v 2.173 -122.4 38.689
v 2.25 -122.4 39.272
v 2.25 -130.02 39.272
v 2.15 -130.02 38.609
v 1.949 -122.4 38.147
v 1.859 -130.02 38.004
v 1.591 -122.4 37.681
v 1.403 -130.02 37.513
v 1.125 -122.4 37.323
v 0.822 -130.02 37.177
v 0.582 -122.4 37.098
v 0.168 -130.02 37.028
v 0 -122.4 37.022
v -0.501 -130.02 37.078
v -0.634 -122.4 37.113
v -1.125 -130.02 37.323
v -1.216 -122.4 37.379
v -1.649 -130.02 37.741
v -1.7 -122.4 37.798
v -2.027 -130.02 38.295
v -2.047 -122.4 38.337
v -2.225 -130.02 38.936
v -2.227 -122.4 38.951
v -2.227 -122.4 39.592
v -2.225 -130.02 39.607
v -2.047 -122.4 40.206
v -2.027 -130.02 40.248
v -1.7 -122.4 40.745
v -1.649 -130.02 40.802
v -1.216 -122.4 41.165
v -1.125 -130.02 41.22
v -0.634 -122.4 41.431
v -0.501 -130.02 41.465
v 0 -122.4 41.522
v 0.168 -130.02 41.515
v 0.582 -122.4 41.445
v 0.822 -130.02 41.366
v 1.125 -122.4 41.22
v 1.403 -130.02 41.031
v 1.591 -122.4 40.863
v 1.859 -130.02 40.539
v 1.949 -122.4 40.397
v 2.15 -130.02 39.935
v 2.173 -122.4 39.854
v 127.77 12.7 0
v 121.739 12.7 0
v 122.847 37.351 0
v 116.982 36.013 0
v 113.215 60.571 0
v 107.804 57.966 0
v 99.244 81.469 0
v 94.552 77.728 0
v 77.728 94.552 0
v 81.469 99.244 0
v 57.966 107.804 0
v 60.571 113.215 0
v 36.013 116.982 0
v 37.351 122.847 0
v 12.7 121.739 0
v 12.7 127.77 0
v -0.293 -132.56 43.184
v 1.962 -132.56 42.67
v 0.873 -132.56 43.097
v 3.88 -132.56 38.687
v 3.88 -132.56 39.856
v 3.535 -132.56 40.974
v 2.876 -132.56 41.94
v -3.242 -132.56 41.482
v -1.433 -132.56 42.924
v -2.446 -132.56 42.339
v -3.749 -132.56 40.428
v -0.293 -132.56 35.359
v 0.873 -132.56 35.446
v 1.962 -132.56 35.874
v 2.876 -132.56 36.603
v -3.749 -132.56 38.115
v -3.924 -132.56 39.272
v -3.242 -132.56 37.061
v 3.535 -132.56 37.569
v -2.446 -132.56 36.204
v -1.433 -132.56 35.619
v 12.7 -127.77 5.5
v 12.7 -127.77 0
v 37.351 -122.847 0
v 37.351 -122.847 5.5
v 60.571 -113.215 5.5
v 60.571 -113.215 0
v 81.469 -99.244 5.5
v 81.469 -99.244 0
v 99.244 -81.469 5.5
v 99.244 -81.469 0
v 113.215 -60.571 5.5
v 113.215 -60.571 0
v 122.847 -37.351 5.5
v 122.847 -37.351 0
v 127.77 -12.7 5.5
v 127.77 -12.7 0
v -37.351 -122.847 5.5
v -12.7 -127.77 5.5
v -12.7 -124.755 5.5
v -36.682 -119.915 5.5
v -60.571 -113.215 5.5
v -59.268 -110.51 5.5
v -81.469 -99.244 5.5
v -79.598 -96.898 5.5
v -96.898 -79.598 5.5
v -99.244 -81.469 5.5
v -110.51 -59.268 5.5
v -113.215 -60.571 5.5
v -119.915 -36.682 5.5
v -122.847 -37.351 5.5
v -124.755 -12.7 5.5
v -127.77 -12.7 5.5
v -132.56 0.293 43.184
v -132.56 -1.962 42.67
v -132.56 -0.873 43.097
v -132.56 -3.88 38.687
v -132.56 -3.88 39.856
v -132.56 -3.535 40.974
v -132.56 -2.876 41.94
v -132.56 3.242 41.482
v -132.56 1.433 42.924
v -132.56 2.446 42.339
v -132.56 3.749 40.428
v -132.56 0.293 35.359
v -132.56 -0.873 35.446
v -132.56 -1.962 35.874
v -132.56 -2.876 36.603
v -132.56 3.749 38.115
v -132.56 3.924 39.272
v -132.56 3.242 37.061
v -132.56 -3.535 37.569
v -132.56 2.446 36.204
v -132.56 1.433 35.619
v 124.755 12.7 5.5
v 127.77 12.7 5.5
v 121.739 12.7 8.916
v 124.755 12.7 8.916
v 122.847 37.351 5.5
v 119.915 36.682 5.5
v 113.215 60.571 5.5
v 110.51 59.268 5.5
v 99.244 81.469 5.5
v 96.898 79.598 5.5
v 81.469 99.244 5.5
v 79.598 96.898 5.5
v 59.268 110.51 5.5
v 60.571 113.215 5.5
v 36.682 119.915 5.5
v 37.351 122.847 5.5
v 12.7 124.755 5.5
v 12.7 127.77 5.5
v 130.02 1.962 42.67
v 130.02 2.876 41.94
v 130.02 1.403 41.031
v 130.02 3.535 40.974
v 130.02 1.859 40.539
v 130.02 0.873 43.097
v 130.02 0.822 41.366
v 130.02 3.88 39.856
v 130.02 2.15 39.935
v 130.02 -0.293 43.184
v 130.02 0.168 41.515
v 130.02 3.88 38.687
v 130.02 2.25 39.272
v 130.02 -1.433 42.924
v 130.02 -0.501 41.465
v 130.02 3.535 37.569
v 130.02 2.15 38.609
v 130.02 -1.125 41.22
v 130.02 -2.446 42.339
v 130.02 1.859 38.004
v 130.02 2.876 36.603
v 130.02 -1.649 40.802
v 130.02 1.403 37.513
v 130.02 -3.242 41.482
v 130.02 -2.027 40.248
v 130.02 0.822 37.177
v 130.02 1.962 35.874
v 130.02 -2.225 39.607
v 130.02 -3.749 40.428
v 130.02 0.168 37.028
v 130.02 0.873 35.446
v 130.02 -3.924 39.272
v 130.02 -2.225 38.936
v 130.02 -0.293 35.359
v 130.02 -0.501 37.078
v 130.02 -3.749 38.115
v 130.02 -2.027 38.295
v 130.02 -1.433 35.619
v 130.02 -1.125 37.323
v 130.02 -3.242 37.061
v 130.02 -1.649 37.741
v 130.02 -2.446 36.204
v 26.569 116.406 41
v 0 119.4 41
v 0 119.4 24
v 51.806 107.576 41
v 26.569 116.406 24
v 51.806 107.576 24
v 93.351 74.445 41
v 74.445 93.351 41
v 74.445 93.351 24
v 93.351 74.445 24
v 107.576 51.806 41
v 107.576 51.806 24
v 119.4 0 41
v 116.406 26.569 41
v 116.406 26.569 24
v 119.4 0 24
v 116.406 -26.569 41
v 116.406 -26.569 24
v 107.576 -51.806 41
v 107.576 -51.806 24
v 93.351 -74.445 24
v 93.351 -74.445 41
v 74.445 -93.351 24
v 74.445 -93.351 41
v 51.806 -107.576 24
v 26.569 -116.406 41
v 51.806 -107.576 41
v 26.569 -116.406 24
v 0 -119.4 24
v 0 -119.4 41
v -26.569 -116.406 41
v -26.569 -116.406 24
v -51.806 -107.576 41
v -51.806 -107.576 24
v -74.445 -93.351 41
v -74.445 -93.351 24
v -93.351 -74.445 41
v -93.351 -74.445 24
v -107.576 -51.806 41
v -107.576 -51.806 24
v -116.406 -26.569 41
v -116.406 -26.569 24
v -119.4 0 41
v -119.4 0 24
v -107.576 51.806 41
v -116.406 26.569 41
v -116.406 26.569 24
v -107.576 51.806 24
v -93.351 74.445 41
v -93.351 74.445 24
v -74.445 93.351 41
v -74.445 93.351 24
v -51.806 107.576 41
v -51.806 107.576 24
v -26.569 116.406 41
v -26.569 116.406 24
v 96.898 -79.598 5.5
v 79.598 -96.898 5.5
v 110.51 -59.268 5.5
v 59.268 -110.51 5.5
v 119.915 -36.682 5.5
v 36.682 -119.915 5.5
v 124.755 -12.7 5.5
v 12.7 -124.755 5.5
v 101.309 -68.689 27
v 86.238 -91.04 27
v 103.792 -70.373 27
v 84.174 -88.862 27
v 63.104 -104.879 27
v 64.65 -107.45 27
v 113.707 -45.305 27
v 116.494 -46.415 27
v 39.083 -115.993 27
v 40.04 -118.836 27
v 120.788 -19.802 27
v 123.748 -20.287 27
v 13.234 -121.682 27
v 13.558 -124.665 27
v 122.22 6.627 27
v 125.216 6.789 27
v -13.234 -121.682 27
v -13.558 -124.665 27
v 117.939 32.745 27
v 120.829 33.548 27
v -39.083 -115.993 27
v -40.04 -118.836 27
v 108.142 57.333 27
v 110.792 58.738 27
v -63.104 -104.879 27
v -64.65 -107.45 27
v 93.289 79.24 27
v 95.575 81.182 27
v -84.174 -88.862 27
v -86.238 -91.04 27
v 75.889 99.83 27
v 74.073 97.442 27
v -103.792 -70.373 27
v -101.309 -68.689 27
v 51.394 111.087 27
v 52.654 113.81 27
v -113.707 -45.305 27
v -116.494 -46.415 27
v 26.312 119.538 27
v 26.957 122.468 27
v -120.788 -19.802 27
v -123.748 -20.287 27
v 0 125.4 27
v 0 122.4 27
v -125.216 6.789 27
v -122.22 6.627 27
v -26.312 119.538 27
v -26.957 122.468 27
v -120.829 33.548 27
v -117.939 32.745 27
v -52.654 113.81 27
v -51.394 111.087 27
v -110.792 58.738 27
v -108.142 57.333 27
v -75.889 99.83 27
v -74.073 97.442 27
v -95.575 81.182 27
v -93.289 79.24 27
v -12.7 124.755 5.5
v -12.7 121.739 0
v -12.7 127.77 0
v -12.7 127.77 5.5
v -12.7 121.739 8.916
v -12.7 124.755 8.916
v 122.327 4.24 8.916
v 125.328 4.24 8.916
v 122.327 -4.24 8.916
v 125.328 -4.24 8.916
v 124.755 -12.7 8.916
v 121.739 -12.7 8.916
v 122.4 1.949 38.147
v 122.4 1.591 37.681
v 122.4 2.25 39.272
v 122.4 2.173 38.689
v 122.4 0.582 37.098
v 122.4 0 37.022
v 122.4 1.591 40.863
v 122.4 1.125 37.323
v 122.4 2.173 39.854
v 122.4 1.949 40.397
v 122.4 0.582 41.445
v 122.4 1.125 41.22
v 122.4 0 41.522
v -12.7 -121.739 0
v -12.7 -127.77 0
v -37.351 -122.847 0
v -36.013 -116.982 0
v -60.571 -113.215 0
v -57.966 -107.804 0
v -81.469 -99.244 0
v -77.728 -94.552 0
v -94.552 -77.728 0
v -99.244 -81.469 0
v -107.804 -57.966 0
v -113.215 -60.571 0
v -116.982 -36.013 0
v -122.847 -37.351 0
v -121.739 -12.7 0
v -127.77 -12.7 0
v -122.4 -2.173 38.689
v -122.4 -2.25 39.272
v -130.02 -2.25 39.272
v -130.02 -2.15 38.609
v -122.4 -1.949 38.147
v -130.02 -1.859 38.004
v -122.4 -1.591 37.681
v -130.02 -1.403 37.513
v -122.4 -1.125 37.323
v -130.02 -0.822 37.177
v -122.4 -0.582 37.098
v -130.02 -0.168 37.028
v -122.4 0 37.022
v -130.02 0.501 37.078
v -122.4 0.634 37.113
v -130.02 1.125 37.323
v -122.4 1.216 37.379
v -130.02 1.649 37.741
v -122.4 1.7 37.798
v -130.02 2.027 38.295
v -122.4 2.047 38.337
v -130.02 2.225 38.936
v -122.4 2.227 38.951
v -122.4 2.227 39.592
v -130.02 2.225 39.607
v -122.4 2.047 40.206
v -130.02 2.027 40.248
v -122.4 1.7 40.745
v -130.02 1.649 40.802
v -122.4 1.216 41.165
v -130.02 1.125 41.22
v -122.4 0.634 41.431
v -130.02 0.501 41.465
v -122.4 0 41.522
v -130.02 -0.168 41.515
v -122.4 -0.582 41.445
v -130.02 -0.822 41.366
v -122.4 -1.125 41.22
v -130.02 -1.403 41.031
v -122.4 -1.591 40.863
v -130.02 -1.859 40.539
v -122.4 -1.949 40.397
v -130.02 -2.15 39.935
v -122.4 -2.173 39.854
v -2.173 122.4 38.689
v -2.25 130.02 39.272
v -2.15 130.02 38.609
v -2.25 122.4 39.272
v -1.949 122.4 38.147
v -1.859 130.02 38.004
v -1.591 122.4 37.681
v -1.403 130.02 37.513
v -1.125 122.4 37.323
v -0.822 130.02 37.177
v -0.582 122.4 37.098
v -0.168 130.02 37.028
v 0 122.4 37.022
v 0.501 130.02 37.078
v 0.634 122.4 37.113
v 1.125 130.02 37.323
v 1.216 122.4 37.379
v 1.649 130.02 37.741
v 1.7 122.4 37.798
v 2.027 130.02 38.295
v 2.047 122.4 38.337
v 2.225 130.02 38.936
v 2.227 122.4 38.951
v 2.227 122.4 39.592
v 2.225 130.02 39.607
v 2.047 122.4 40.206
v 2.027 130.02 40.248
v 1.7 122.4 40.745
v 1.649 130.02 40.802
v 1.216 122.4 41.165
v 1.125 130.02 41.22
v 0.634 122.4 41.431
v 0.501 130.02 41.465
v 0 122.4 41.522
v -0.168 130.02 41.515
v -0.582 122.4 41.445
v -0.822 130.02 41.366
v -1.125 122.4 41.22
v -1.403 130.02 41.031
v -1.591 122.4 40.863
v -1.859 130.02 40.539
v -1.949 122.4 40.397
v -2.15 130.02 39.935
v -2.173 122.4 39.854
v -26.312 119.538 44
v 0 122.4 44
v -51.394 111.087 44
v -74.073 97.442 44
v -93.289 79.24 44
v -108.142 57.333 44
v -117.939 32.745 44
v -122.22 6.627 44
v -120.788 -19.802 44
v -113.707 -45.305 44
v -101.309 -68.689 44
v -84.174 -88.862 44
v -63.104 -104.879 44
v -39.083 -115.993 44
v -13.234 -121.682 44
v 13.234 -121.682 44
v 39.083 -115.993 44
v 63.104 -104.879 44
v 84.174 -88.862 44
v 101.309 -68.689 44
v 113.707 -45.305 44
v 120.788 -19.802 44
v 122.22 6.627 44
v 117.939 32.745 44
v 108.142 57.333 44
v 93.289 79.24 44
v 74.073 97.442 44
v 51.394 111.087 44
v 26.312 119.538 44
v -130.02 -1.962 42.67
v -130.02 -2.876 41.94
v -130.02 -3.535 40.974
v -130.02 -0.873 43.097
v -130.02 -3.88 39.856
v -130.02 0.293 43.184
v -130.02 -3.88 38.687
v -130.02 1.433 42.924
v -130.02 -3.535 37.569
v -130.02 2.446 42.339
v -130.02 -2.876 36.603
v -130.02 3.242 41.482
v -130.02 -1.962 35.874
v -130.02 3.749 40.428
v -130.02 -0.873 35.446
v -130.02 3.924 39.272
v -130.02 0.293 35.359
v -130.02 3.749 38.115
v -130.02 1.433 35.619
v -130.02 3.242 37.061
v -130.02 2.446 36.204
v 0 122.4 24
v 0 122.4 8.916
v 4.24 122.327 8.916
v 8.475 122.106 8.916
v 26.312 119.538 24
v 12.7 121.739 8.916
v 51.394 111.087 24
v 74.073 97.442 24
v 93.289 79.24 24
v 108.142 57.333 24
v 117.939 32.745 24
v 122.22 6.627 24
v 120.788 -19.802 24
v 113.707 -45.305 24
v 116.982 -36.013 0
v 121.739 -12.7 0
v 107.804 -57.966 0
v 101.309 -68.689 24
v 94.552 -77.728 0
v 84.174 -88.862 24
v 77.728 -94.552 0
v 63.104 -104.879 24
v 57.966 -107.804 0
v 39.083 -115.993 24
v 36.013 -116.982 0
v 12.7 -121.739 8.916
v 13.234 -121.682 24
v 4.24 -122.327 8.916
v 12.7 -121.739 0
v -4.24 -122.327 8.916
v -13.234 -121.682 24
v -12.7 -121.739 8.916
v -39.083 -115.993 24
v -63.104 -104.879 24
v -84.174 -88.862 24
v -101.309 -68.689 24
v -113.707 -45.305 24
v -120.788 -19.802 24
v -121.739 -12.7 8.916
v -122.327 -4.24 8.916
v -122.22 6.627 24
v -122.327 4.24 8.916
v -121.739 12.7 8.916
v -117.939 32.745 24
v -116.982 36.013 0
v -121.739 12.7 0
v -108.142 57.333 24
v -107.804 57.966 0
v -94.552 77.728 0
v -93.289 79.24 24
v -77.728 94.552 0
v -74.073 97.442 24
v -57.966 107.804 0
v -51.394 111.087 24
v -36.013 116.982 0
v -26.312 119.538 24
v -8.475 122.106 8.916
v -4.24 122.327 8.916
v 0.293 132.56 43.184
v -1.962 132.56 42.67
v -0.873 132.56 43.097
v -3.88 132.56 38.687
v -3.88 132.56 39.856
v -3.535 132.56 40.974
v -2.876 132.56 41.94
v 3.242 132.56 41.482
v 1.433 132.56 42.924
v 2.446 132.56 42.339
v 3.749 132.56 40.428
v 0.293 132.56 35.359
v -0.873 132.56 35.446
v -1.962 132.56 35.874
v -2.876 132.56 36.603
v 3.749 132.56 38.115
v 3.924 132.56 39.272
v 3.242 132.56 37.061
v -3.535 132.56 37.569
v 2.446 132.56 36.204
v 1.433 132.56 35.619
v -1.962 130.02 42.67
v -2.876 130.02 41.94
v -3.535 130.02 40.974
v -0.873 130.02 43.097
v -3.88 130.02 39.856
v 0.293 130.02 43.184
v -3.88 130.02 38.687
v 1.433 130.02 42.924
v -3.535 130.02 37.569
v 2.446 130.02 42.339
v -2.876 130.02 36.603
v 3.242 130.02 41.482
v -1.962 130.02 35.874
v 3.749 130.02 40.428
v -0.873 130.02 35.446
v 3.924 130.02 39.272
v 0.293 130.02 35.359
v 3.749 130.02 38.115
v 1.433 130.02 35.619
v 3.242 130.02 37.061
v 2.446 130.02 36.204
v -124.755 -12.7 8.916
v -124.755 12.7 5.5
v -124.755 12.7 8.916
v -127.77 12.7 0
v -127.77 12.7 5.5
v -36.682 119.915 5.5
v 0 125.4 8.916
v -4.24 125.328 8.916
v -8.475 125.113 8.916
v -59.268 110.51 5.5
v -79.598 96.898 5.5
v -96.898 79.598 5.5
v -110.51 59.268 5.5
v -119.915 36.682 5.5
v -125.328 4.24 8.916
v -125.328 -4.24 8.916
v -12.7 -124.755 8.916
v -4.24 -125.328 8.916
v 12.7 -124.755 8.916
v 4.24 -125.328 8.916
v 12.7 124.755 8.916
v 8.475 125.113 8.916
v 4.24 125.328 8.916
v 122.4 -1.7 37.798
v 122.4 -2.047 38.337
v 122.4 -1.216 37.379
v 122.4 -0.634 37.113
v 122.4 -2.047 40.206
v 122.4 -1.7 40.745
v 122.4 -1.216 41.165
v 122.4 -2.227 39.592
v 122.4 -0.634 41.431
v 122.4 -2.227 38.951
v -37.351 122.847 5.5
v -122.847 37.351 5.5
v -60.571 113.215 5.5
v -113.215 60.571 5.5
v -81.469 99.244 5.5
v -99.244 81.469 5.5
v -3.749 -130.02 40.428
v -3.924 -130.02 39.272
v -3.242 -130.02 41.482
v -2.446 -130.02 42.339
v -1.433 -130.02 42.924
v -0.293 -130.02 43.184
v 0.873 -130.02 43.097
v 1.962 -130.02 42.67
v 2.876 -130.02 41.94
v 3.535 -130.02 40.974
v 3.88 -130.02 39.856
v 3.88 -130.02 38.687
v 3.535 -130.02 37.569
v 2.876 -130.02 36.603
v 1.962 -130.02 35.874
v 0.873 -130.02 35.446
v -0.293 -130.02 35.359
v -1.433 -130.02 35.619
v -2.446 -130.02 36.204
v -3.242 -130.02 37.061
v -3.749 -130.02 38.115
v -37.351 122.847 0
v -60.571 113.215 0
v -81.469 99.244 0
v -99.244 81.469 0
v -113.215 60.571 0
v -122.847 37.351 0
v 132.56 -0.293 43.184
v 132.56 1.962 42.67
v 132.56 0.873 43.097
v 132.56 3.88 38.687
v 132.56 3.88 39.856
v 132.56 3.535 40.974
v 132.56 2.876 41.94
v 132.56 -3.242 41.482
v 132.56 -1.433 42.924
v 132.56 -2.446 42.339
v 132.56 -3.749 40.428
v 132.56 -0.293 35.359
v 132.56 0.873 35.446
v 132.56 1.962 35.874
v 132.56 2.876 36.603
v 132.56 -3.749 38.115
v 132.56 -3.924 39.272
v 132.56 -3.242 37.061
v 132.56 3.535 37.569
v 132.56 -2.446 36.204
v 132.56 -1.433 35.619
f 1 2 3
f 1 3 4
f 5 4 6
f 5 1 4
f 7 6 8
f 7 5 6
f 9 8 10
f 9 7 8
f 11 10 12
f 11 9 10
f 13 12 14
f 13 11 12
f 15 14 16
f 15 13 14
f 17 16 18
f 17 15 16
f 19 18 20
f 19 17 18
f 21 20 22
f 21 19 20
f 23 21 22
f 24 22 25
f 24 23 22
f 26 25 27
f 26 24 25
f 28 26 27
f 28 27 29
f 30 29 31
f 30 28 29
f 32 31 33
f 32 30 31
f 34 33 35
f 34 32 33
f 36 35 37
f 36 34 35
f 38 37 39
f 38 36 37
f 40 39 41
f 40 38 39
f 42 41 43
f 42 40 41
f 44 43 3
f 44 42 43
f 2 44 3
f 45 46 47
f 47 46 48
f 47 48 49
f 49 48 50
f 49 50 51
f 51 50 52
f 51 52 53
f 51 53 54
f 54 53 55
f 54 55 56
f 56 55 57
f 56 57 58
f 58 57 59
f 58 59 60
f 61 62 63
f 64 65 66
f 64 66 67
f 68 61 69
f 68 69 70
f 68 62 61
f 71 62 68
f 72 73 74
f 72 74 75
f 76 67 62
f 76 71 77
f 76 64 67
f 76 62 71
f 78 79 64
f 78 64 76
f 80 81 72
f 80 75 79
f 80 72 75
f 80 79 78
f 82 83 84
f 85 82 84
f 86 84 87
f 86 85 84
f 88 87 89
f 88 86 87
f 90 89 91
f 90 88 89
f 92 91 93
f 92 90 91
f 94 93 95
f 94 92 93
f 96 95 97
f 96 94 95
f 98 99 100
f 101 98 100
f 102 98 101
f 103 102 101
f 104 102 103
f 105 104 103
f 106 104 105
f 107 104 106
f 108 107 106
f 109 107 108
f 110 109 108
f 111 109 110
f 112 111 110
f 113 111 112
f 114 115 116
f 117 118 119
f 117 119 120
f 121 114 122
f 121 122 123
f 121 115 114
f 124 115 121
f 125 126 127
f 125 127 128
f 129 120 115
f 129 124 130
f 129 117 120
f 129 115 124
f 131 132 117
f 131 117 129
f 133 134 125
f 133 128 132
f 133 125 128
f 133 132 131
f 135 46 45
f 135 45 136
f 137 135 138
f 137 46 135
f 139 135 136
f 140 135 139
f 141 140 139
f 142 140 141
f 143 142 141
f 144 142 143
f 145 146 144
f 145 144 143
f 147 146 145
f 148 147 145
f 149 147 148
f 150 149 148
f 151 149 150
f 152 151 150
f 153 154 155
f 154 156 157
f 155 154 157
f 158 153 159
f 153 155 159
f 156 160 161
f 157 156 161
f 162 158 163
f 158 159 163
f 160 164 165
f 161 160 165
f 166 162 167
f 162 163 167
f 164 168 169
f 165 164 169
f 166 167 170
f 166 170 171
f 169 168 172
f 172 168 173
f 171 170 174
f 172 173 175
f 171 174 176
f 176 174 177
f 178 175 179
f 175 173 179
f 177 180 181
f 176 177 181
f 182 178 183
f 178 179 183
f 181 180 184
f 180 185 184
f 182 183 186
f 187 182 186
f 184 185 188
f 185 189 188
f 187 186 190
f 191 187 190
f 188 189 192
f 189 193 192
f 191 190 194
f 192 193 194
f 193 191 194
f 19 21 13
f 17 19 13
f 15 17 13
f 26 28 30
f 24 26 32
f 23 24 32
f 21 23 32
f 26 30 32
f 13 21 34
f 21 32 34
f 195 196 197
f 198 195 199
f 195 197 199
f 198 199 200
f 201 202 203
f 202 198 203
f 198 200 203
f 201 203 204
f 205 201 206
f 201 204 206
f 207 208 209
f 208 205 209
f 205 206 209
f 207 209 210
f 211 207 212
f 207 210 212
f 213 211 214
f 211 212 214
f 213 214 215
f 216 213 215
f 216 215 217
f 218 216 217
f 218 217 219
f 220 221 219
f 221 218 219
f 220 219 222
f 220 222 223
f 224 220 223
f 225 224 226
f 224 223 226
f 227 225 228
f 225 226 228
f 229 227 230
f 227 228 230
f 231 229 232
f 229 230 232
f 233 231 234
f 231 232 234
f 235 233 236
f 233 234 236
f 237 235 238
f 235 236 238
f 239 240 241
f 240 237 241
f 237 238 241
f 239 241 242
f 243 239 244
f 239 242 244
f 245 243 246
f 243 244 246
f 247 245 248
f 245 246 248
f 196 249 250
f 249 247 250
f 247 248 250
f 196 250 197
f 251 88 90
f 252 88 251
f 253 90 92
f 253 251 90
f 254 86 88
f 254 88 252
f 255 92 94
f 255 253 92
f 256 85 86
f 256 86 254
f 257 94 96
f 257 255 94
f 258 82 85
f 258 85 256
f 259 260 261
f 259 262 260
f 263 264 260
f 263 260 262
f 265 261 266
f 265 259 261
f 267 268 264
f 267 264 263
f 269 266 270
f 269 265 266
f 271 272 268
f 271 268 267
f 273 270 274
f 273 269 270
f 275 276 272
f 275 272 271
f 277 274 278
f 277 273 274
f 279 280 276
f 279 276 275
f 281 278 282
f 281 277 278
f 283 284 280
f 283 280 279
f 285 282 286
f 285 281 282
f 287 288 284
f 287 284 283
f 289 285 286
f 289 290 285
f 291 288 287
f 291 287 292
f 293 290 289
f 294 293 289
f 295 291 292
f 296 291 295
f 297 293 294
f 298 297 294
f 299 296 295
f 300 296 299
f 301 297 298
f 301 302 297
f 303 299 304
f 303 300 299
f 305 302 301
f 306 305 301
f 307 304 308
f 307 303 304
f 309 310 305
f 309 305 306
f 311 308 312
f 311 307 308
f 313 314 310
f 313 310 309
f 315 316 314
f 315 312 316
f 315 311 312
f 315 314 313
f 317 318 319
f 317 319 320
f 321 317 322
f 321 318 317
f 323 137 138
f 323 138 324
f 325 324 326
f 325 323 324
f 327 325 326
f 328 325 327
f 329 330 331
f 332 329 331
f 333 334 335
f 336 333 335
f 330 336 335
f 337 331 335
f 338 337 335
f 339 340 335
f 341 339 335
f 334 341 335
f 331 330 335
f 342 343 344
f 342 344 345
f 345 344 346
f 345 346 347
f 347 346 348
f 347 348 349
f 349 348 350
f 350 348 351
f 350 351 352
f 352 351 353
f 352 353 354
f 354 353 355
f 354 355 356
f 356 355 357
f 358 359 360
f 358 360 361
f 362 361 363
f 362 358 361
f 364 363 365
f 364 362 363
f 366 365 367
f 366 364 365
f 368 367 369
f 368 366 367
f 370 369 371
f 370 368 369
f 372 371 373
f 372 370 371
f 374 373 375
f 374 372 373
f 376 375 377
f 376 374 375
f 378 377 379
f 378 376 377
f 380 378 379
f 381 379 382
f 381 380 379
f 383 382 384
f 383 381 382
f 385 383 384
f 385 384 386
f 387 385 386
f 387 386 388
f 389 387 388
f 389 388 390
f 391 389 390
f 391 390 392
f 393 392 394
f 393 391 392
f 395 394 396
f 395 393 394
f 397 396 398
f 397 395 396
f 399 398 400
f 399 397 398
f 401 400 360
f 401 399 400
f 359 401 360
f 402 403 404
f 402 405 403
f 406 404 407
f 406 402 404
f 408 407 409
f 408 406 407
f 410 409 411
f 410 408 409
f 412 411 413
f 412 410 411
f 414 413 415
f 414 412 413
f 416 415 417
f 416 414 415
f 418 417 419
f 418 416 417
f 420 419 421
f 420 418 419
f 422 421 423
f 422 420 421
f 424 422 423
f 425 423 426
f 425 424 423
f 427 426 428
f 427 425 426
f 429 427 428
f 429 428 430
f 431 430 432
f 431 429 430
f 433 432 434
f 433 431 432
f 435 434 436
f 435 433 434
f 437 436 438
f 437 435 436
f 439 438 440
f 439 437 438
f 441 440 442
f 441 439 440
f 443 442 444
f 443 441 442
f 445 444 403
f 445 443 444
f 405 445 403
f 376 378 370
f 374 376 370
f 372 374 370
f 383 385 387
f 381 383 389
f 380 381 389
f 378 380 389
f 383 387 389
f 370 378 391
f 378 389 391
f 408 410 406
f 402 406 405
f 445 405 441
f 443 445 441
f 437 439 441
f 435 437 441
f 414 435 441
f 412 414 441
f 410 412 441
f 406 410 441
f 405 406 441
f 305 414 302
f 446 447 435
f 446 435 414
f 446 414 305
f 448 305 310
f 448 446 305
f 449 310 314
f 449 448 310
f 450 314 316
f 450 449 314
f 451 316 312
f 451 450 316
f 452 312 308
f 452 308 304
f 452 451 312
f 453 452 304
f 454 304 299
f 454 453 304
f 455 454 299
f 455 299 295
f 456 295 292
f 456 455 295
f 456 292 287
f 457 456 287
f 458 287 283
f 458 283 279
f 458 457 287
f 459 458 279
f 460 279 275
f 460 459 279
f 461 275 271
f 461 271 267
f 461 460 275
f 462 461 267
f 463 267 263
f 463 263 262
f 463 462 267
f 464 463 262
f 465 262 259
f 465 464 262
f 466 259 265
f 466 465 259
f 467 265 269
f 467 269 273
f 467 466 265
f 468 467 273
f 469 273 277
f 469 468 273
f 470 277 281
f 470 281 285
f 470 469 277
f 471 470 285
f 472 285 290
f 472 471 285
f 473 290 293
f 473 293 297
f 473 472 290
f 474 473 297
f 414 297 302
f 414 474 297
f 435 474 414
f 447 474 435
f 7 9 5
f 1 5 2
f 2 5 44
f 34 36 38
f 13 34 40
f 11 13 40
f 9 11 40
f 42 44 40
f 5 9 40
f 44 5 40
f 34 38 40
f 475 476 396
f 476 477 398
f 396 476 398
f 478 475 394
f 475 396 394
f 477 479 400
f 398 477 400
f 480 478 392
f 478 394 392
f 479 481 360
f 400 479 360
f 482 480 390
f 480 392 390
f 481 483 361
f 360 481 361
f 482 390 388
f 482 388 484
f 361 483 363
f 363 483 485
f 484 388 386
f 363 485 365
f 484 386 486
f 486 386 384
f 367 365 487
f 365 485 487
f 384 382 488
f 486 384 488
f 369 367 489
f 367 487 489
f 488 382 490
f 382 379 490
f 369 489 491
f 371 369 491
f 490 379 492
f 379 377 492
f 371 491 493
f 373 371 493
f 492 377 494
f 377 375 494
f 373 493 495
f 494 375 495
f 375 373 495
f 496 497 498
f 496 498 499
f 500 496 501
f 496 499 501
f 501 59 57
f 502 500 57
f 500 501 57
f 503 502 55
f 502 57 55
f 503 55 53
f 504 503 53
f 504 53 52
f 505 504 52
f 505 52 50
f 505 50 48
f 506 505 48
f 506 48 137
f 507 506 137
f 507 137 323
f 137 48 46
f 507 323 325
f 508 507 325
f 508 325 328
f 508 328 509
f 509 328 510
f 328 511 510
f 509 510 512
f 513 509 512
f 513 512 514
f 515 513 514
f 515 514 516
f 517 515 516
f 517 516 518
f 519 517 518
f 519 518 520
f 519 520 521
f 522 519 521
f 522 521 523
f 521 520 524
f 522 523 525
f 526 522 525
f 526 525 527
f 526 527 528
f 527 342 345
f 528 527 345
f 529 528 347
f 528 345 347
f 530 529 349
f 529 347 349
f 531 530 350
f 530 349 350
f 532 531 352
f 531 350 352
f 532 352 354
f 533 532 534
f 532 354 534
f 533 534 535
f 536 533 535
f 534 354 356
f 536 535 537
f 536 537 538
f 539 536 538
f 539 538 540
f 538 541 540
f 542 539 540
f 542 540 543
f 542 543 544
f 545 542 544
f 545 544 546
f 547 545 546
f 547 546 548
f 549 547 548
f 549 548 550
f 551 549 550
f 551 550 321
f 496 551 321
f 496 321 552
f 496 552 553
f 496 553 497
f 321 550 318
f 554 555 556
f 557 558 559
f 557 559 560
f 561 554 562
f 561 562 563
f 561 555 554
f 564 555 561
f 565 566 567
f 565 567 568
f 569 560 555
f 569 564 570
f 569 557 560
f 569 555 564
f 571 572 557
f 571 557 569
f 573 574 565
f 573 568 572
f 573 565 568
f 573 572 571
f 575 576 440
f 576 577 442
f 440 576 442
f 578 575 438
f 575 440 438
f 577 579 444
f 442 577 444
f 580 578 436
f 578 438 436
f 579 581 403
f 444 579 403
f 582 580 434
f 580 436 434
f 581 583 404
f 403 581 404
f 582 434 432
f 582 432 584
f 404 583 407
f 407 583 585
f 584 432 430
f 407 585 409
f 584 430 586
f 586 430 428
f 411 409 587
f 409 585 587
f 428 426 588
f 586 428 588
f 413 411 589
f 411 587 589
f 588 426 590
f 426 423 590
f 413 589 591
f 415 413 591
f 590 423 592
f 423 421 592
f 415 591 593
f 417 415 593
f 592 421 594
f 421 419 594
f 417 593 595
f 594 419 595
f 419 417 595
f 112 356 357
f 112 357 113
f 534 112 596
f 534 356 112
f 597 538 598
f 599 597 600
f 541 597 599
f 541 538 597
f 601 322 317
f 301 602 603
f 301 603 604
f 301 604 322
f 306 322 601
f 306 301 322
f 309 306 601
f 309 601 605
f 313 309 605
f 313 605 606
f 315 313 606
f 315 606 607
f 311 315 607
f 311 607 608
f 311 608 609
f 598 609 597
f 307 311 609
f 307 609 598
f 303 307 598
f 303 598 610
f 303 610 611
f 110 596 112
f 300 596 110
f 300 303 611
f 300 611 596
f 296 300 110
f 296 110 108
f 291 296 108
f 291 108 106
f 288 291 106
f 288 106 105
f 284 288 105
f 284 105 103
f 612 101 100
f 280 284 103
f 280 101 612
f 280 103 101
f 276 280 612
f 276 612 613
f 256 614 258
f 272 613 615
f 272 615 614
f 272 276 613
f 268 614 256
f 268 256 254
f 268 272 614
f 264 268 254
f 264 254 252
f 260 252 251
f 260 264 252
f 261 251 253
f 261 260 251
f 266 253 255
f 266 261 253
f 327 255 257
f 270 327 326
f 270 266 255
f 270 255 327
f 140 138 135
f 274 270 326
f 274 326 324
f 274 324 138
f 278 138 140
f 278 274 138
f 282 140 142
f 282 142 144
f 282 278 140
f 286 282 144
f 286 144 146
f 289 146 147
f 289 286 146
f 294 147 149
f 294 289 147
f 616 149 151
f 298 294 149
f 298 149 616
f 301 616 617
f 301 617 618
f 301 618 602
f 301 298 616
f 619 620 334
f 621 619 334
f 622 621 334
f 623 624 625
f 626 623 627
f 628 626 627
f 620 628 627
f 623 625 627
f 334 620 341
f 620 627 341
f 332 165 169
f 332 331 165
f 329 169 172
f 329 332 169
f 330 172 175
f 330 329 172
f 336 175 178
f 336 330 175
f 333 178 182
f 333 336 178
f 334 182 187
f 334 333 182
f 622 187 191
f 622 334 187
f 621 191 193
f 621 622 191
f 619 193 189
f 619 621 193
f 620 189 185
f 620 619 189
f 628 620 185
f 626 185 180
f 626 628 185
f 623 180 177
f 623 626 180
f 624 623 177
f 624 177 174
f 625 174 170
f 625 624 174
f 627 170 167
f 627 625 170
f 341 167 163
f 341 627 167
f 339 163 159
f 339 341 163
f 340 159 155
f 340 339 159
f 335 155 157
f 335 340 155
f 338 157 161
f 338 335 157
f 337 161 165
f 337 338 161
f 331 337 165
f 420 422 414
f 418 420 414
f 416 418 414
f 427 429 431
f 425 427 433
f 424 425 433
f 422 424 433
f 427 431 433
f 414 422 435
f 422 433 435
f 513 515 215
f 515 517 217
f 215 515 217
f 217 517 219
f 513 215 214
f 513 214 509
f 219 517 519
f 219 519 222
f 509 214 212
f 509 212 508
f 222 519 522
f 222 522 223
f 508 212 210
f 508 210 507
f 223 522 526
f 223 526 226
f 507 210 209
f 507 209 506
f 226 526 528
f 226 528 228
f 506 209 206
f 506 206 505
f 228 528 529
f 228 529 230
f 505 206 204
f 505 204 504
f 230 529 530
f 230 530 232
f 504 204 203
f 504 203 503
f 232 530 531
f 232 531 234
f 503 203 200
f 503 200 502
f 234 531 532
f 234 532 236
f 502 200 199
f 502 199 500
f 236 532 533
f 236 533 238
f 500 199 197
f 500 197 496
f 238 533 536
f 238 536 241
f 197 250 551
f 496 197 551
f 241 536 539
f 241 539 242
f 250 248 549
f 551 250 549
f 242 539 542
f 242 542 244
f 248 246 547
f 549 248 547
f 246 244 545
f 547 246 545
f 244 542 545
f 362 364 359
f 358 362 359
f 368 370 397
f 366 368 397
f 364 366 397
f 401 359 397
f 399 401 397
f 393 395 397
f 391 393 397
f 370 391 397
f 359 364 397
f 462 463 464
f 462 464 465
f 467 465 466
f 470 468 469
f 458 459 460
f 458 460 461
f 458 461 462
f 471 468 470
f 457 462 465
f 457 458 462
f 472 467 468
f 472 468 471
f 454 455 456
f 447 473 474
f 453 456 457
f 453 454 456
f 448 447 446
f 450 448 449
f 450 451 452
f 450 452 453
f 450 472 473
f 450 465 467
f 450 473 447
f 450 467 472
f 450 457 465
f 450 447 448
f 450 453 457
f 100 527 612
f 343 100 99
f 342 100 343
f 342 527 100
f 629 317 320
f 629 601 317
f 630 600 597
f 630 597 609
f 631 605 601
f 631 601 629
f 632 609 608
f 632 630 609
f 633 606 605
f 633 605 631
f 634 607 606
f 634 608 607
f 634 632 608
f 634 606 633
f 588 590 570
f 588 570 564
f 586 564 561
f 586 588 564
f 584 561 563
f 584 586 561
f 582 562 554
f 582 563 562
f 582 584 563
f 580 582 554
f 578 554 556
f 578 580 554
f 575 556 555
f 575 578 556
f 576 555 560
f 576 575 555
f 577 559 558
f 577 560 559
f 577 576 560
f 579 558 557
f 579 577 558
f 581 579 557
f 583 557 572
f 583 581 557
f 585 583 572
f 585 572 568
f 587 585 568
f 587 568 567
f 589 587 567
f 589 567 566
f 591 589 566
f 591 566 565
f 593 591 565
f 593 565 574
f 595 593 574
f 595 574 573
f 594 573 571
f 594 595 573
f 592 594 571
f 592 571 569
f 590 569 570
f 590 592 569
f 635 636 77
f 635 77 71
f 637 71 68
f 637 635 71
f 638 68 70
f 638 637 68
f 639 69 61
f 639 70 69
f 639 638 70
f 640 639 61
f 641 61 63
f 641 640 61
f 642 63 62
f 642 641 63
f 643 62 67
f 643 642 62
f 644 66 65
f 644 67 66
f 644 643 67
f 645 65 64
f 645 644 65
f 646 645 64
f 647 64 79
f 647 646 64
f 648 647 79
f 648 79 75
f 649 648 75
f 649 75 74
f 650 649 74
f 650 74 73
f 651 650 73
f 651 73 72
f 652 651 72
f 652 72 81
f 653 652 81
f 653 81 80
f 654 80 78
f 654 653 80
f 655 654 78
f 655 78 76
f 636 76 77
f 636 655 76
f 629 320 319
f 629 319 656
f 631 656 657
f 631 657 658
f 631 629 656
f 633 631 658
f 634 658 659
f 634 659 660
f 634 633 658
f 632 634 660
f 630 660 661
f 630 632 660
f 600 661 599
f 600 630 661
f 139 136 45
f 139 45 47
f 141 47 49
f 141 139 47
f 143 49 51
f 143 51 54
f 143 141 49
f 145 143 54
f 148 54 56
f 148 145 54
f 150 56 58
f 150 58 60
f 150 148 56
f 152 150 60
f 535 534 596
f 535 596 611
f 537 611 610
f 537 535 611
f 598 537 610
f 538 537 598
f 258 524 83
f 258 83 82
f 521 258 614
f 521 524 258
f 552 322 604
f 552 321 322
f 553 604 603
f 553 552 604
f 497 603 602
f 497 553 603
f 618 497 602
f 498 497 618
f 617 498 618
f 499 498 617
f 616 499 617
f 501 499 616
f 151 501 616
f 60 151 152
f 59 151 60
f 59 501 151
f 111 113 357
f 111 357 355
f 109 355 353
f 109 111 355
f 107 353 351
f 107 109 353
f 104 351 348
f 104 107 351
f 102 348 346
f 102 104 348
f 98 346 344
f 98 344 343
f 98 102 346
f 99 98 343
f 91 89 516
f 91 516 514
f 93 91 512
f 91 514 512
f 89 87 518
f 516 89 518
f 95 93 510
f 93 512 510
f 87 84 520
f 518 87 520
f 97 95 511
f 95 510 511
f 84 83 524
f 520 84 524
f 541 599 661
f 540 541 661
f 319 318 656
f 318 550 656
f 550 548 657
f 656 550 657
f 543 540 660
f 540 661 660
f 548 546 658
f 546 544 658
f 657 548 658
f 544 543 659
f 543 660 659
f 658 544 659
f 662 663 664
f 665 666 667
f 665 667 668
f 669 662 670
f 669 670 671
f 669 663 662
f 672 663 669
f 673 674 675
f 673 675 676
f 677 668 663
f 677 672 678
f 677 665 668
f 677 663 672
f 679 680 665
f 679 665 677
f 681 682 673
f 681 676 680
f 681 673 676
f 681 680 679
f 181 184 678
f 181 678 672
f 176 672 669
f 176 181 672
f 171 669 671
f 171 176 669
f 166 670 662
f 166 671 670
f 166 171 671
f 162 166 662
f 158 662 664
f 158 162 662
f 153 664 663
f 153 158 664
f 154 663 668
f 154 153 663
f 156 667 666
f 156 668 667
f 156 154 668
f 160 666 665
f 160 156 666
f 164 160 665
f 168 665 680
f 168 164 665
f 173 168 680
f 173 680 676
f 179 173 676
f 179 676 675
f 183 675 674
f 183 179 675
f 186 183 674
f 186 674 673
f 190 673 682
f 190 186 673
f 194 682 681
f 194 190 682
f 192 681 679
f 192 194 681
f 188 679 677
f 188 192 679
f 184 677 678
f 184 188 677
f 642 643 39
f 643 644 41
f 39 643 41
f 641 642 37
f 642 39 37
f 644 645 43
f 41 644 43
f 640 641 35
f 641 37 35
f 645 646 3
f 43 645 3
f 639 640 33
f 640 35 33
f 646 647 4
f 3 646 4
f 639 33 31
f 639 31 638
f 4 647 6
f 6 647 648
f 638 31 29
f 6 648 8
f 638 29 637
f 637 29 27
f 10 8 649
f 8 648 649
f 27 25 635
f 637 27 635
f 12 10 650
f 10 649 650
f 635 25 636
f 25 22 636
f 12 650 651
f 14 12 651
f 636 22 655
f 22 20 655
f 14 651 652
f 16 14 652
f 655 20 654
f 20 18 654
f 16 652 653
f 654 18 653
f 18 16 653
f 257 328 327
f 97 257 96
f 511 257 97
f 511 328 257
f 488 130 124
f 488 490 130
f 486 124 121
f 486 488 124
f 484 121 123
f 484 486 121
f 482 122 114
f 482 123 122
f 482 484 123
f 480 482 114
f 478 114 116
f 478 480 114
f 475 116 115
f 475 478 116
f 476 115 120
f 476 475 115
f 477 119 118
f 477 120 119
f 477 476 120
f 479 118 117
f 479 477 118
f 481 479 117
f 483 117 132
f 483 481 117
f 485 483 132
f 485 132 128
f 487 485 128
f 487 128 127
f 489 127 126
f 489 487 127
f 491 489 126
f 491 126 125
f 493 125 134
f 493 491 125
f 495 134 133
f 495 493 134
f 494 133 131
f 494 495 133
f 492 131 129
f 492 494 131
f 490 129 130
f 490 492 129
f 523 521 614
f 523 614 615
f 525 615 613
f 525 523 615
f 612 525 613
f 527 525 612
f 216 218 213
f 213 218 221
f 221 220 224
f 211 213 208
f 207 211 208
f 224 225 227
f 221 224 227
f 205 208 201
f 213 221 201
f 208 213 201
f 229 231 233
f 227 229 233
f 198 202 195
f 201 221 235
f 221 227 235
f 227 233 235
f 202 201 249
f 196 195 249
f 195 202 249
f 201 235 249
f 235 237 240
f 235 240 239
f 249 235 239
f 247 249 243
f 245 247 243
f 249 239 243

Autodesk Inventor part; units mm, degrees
ref_plane "YZ Plane" through (0, 0, 0) normal (1, 0, 0) x (0, 1, 0)
ref_plane "XY Plane" through (0, 0, 0) normal (0, 0, 1) x (1, 0, 0)
sketch "Sketch2" plane through (0, 0, 0) normal (1, 0, 0) x (0, 1, 0)
  line L0 (128.4, 0) -> (128.4, 5.5)
  line L1 (128.4, 5.5) -> (125.4, 5.5)
  line L2 (125.4, 5.5) -> (125.4, 27)
  line L3 (125.4, 27) -> (122.4, 27)
  line L4 (122.4, 27) -> (122.4, 44)
  line L5 (122.4, 44) -> (0, 44)
  line L6 (0, 44) -> (0, 41)
  line L7 (0, 41) -> (119.4, 41)
  line L8 (119.4, 41) -> (119.4, 24)
  line L9 (119.4, 24) -> (122.4, 24)
  line L10 (122.4, 24) -> (122.4, 0)
  line L11 (122.4, 0) -> (128.4, 0)
  line L12 (0, 0) -> (0, 41) construction
  line L13 (122.4, 0) -> (0, 0) construction
  line L14 (122.4, 24) -> (122.4, 27) construction
  dimension "d3" = 17
  dimension "d4" = 44
  dimension "d5" = 5.5
  dimension "d6" = 3
  dimension "d8" = 122.4
revolve "Revolution1" add sketch "Sketch2" angle 360 about axis through (0, 0, 0) along (0, 0, 1)
ref_plane "Work Plane1" through (0, 122.4, 35.5) normal (0, 1, 0) x (-1, 0, 0)
sketch "Sketch4" plane through (0, 122.4, 35.5) normal (0, 1, 0) x (-1, 0, 0)
  circle A0 centre (0, 3.7717) radius 2.25
  line L0 (-122.4, 8.5) -> (122.4, 8.5) projected
  line L1 (0, 3.7717) -> (0, 8.5) construction
  point P0 (0, -35.5)
  dimension "d9" = 4.5
extrude "Extrusion2" add sketch "Sketch4" along normal blind 7.62
sketch "Sketch5" plane through (0, 130.02, 39.2717) normal (0, 1, 0) x (1, 0, 0)
  arc A0 (0, 2.25) -> (0, -2.25) centre (0, 0) ccw projected
  circle A1 centre (0, 0) radius 3.9236
  point P0 (0, 39.2717)
extrude "Extrusion3" add sketch "Sketch5" along normal blind 2.54
pattern_circular "Circular Pattern1" count 4 over 360 about axis through (0, 0, 35.5) along (0, 0, -1) of "Extrusion2", "Extrusion3"
sketch "Sketch6" plane through (0, 122.4, 35.5) normal (0, 1, 0) x (-1, 0, 0)
  line L0 (-128.4, -35.5) -> (128.4, -35.5) projected
  line L1 (-122.4, -35.5) -> (122.4, -35.5) projected
  line L2 (12.7, -26.5844) -> (-12.7, -26.5844)
  line L3 (-12.7, -26.5844) -> (-12.7, -35.5)
  line L4 (-12.7, -35.5) -> (12.7, -35.5)
  line L5 (12.7, -35.5) -> (12.7, -26.5844)
  line L6 (12.7, -26.5844) -> (-12.7, -35.5) construction
  line L7 (-12.7, -26.5844) -> (12.7, -35.5) construction
  line L8 (0, -31.0422) -> (0, -35.5) construction
  dimension "d20" = 25.4
extrude "Extrusion4" cut sketch "Sketch6" along normal mid plane 25.4
pattern_circular "Circular Pattern2" count 4 over 360 about axis through (0, 0, 35.5) along (0, 0, -1) of "Extrusion4"
properties part number "light"
